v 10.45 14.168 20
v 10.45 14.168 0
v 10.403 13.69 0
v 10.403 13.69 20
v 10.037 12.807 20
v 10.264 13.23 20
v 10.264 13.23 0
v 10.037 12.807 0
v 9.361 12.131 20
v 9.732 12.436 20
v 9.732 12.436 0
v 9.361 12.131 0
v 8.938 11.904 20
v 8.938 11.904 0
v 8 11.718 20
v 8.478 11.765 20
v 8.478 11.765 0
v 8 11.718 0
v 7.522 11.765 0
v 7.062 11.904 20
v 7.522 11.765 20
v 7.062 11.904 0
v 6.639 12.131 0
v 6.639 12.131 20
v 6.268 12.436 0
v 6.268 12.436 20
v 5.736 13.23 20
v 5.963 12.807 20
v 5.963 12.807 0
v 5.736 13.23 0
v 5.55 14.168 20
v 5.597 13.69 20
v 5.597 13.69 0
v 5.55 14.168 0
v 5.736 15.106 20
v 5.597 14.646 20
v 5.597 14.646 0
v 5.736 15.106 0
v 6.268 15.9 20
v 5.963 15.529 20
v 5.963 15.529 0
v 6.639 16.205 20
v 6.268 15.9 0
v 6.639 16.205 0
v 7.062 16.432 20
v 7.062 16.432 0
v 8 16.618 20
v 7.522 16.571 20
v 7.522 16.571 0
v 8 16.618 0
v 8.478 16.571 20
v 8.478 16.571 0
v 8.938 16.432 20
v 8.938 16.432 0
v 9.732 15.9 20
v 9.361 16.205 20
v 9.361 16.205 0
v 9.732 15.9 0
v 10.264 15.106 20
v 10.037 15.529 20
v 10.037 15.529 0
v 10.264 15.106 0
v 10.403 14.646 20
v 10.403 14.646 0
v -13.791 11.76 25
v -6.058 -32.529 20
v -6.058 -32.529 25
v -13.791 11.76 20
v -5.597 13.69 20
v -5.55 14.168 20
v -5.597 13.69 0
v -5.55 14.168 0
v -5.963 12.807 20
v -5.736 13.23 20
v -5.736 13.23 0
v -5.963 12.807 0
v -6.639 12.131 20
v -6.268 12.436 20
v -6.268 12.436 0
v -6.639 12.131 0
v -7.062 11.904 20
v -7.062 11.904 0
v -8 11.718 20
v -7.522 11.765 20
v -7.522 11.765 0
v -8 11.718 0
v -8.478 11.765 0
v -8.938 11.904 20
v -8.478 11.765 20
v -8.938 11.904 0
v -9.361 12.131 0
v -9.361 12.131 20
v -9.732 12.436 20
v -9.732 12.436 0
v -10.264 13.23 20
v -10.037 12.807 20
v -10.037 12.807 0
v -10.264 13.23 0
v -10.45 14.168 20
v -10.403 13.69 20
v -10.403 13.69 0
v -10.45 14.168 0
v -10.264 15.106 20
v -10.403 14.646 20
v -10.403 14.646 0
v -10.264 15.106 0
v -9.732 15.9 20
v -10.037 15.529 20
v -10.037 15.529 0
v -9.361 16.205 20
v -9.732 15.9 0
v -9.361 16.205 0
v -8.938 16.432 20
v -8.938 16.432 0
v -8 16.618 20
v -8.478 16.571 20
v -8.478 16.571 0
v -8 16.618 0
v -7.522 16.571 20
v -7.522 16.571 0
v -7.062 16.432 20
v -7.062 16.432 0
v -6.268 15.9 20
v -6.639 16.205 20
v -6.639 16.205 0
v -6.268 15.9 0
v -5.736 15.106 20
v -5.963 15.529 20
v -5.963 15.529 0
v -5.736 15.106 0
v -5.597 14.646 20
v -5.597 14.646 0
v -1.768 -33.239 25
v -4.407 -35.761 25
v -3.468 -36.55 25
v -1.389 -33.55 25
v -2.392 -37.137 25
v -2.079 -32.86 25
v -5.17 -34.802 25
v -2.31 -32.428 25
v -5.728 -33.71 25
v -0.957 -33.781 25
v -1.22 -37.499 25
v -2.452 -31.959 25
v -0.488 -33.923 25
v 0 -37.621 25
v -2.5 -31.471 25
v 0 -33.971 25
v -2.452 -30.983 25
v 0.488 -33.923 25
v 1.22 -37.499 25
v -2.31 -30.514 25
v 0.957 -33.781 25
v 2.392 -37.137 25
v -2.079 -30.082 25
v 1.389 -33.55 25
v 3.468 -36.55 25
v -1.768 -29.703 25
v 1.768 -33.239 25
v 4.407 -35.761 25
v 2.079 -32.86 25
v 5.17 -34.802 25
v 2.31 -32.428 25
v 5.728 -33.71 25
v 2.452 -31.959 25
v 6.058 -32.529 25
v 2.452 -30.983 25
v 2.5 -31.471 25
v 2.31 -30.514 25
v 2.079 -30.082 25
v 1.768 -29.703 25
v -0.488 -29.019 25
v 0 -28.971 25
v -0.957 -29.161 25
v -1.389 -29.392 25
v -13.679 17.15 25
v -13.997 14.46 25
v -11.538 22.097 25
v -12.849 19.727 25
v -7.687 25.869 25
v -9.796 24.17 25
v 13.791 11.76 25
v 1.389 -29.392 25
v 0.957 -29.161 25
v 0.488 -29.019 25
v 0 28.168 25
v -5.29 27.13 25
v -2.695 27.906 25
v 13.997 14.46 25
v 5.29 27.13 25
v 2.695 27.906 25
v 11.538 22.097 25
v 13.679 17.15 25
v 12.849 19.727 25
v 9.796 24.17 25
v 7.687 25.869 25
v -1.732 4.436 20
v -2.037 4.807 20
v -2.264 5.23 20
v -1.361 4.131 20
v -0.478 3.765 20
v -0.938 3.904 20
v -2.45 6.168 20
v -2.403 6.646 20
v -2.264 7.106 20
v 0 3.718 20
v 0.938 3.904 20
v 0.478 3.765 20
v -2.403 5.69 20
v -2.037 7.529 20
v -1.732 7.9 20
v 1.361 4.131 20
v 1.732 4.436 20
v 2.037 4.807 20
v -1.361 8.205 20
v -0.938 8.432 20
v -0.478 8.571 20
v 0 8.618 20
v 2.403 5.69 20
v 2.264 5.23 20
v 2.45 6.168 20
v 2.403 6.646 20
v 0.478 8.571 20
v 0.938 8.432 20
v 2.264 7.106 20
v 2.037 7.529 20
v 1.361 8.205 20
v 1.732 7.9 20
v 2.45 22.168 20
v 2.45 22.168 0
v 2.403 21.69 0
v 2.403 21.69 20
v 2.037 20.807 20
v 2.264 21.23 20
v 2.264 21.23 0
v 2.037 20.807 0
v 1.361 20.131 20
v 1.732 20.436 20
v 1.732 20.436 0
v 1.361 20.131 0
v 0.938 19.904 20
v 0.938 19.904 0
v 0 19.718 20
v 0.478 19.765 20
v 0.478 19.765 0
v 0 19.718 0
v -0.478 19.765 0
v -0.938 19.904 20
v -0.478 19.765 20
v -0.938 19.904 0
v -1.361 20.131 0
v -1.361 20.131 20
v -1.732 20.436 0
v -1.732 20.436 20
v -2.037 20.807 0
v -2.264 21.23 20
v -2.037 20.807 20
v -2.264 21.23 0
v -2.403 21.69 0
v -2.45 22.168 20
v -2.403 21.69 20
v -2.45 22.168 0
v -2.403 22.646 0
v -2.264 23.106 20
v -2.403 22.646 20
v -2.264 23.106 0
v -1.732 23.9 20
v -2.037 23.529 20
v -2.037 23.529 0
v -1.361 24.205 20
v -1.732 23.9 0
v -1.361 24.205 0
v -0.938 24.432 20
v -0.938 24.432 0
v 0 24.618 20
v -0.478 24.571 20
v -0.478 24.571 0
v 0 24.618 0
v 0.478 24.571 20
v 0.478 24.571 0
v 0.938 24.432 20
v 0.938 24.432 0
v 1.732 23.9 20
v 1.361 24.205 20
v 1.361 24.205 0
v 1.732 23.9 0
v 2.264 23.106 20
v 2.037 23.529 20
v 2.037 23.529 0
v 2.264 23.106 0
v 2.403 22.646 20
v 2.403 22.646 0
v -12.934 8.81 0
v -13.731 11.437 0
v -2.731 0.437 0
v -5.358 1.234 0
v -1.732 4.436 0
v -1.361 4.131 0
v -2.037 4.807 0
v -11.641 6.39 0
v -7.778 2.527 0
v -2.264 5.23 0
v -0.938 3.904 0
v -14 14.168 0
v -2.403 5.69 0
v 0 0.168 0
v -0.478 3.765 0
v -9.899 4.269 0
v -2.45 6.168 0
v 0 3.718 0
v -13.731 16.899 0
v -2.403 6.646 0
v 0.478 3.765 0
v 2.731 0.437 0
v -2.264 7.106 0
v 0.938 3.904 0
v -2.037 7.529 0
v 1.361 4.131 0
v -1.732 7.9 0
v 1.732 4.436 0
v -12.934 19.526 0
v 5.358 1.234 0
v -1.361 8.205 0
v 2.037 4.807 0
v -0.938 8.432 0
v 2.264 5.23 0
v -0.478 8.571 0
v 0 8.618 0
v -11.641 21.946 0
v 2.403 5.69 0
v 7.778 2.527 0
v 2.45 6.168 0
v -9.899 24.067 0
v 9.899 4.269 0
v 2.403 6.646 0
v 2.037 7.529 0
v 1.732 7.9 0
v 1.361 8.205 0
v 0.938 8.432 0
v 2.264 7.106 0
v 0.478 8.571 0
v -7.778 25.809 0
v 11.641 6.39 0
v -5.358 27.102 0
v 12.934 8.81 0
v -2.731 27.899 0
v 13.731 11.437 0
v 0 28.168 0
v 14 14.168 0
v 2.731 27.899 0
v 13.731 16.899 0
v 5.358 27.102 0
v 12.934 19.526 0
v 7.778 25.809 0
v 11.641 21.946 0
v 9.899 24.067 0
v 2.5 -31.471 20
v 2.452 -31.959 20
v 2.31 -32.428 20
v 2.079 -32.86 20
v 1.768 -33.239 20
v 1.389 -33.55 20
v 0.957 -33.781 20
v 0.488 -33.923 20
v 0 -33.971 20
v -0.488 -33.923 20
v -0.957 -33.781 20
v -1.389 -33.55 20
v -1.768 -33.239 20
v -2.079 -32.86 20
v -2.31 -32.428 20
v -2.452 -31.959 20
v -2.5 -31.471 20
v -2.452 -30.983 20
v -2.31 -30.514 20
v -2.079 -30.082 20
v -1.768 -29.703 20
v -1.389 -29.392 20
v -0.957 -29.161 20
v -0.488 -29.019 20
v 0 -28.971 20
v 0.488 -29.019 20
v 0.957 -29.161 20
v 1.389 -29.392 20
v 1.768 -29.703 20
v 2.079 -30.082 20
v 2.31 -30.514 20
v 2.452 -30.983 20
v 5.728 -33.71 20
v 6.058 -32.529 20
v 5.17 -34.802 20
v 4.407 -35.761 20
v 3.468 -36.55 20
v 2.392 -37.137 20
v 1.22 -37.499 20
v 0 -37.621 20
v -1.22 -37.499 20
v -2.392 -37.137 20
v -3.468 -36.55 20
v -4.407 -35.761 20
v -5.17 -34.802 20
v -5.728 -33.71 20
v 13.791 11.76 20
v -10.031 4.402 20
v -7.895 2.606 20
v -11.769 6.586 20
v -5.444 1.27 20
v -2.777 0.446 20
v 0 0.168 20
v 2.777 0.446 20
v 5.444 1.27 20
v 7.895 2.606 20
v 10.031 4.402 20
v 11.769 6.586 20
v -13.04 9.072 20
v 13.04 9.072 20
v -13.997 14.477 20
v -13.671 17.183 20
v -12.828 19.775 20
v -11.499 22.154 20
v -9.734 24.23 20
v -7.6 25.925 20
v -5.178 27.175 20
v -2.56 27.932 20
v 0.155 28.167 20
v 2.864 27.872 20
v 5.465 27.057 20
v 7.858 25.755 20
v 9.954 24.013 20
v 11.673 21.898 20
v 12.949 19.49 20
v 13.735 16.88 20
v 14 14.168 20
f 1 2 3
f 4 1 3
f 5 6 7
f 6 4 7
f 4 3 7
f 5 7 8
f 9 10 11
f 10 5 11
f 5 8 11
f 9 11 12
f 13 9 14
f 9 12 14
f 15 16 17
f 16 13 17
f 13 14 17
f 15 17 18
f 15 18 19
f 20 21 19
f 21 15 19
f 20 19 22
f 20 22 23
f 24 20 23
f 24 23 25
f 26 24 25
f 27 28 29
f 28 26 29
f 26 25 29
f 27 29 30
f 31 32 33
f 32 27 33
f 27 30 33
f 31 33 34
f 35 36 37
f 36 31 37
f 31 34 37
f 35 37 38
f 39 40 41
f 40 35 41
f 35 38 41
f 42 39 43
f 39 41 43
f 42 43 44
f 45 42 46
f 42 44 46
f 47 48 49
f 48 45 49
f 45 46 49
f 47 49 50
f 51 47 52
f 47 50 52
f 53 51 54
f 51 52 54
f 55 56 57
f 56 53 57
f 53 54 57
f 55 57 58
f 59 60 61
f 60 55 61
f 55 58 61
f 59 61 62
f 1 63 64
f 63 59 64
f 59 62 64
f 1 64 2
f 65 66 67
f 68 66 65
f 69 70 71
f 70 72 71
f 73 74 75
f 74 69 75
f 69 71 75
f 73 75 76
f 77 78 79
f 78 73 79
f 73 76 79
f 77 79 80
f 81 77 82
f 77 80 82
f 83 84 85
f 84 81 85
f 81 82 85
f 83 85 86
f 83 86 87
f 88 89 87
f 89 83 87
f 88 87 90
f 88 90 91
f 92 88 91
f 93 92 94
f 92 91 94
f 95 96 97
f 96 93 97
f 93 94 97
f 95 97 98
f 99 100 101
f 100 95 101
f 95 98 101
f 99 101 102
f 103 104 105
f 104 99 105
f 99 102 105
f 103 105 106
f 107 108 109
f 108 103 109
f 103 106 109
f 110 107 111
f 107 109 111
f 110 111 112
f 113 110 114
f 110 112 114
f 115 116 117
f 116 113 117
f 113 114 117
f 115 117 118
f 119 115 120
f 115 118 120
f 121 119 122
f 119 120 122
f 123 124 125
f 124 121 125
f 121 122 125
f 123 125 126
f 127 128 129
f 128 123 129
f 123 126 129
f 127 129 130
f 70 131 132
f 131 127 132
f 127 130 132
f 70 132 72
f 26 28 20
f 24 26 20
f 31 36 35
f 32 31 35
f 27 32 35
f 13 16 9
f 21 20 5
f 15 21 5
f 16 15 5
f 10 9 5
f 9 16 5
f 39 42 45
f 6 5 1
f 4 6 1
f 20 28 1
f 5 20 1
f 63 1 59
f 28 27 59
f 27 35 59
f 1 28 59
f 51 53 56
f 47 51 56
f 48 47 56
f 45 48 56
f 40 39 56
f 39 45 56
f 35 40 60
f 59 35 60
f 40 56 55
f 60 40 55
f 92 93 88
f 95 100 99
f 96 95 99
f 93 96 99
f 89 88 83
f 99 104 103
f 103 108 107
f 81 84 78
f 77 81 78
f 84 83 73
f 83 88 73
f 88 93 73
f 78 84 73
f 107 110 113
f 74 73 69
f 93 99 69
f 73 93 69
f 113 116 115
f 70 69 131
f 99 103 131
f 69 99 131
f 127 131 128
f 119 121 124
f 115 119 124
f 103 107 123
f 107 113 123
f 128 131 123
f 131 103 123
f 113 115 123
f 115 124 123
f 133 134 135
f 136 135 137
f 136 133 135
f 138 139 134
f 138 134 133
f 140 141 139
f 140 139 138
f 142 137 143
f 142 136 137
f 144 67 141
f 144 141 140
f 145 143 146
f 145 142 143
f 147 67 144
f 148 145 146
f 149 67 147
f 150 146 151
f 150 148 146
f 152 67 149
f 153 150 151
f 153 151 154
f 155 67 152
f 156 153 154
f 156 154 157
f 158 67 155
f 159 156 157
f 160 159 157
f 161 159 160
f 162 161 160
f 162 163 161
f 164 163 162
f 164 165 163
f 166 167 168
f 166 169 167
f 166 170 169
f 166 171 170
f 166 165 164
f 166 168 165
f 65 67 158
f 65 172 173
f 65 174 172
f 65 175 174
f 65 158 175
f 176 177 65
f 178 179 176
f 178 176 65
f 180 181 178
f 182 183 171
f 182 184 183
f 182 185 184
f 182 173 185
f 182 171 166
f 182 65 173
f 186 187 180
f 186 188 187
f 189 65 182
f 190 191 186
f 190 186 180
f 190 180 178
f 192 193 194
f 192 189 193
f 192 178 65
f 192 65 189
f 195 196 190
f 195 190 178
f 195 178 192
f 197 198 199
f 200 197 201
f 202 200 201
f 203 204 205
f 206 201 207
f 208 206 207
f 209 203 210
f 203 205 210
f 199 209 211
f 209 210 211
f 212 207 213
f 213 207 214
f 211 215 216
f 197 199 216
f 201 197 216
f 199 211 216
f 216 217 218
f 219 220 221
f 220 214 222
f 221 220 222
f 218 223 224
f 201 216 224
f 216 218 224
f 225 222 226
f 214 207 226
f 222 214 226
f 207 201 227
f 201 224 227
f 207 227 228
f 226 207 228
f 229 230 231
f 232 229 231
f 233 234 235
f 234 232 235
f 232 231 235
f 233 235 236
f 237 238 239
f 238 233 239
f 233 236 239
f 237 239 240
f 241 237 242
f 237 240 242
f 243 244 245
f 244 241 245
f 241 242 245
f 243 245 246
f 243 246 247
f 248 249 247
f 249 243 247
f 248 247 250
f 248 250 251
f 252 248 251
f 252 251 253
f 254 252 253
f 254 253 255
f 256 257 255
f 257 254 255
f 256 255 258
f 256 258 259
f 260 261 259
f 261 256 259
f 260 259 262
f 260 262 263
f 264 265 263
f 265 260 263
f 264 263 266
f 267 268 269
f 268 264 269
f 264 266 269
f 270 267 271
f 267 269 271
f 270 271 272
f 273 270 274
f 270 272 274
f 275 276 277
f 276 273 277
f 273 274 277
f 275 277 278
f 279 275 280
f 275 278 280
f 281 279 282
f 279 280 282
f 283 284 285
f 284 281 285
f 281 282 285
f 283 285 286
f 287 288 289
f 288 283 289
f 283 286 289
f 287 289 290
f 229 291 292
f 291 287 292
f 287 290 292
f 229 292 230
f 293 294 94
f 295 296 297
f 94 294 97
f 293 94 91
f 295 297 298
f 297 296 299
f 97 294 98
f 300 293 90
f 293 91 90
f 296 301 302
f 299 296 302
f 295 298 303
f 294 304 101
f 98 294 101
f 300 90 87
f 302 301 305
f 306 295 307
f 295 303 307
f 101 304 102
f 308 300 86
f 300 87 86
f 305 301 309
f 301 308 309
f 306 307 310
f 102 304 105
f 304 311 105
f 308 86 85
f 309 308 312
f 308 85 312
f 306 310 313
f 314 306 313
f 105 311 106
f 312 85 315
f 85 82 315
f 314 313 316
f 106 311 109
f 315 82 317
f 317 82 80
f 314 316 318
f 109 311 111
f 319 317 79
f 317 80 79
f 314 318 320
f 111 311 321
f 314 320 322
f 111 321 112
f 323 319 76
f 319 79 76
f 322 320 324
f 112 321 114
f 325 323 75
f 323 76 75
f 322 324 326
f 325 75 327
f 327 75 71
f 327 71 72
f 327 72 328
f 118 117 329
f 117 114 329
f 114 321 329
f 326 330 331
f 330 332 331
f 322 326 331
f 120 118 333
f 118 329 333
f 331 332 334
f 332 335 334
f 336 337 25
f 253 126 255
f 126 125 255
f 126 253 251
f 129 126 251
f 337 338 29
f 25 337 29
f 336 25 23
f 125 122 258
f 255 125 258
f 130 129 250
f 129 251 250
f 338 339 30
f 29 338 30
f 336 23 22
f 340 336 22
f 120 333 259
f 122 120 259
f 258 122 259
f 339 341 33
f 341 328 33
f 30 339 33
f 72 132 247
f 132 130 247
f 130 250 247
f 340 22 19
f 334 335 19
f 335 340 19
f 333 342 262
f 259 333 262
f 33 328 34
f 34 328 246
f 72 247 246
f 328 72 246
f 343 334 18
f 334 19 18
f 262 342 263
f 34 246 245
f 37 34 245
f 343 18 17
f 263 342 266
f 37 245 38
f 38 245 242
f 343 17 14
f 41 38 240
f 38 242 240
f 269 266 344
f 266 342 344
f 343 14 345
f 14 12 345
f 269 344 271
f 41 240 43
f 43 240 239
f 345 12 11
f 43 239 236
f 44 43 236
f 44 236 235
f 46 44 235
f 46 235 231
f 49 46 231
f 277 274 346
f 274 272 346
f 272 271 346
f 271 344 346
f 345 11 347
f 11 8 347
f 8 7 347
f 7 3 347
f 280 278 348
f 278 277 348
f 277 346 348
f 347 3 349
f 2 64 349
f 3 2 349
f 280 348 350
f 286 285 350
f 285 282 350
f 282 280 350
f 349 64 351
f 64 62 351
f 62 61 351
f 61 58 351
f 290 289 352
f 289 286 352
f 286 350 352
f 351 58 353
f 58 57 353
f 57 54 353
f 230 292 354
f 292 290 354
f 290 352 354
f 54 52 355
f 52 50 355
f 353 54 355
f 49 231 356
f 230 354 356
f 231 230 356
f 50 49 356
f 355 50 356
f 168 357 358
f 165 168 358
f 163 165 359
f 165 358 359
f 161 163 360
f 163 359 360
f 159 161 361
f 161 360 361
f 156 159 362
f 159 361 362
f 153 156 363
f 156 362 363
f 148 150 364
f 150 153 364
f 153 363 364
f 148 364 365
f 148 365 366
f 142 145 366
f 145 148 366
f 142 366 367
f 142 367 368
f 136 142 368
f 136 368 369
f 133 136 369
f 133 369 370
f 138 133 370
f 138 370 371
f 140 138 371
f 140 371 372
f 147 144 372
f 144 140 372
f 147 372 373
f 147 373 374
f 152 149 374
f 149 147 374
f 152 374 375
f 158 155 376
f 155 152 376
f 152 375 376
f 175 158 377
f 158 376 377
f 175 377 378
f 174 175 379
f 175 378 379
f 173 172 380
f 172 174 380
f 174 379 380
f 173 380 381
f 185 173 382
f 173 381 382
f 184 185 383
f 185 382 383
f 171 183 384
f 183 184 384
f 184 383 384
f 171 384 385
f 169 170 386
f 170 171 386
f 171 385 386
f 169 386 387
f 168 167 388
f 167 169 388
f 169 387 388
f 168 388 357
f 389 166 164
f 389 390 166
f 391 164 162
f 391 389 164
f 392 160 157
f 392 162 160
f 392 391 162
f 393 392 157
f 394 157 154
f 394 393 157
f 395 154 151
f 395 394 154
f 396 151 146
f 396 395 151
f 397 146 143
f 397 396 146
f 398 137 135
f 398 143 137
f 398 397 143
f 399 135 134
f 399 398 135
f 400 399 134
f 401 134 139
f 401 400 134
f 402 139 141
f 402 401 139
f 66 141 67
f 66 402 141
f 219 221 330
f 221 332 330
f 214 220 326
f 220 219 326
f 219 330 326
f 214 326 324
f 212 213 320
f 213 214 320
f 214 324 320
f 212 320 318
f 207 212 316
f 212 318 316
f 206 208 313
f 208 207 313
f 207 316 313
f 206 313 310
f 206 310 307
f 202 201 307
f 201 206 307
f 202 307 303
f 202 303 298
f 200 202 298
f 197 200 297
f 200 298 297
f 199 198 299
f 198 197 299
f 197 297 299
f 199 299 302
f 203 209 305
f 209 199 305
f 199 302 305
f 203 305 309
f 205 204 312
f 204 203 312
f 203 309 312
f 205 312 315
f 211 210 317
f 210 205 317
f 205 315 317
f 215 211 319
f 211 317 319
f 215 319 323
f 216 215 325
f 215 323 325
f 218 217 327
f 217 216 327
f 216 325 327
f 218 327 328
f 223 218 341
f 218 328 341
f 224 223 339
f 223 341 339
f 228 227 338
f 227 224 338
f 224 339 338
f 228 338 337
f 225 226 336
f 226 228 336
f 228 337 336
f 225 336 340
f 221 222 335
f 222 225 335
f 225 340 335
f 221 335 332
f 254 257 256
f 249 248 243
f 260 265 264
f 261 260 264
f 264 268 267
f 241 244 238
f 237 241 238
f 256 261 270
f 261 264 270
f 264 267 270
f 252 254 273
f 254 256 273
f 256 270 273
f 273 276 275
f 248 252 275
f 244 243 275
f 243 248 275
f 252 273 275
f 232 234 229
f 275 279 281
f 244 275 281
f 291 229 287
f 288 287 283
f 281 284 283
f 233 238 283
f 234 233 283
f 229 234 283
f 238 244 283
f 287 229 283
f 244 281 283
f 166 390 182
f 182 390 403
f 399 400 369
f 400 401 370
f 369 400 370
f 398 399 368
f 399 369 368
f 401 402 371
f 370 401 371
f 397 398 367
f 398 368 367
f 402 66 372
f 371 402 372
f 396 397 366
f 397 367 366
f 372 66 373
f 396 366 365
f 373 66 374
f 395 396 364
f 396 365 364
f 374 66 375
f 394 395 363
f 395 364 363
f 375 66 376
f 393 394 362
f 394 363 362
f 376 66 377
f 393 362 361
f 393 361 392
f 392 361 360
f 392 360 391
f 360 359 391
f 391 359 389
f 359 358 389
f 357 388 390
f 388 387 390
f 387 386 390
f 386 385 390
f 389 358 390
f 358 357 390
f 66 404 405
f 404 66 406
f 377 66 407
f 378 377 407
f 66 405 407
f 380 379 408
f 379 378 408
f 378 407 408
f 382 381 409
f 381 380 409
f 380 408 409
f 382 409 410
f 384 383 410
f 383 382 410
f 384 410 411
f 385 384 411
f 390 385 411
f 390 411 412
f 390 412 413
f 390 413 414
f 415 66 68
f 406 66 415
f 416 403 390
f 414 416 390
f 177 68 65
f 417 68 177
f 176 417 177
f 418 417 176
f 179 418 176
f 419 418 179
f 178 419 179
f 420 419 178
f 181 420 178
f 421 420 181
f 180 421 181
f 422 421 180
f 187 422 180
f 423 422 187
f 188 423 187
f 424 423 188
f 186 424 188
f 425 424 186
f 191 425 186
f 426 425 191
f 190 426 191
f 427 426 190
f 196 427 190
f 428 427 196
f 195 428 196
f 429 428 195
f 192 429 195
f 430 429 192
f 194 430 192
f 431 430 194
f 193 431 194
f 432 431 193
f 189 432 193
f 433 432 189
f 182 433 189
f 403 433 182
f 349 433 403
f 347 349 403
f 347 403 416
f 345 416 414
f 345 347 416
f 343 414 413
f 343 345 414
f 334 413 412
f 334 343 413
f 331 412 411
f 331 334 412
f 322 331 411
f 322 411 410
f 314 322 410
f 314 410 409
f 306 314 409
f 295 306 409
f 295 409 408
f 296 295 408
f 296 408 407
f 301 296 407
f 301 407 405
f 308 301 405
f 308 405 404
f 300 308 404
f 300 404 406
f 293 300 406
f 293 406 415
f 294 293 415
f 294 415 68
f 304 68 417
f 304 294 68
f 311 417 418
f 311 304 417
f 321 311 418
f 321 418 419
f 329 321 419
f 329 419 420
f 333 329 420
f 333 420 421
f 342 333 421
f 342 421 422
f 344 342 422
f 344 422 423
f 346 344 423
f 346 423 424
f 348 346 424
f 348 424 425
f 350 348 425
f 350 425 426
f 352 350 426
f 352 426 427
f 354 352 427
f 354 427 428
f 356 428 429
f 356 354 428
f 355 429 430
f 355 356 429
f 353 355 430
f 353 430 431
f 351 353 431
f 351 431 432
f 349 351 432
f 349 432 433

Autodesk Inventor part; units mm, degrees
ref_plane "YZ Plane" through (0, 0, 0) normal (1, 0, 0) x (0, 1, 0)
ref_plane "XZ Plane" through (0, 0, 0) normal (0, 1, 0) x (-1, 0, 0)
ref_plane "XY Plane" through (0, 0, 0) normal (0, 0, 1) x (1, 0, 0)
ref_plane "Work Plane1" through (0, 0, 0) normal (0, 0, 1) x (1, 0, 0)
sketch "Sketch1" plane through (0, 0, 0) normal (0, 0, 1) x (1, 0, 0)
  circle A0 centre (0, 14.168) radius 14 projected
  circle A1 centre (8, 14.168) radius 2.45
  circle A2 centre (-8, 14.168) radius 2.45
  circle A3 centre (0, 14.168) radius 14
  circle A4 centre (0, 6.168) radius 2.45
  circle A5 centre (0, 22.168) radius 2.45
  point P0 (0, 0)
  dimension "d0" = 4.9
  dimension "d1" = 4.9
  dimension "d2" = 8
  dimension "d3" = 8
  dimension "d9" = 4.9
  dimension "d10" = 4.9
  dimension "d11" = 8
  dimension "d12" = 8
extrude "Extrusion1" add sketch "Sketch1" along normal blind 20
sketch "Sketch2" plane through (0, 14.168, 20) normal (0, 0, 1) x (1, 0, 0)
  circle A0 centre (-8, 0) radius 2.45 projected
  circle A1 centre (8, 0) radius 2.45 projected
  circle A2 centre (0, 0) radius 14 projected
  circle A3 centre (0, -45.639) radius 6.15 construction
  circle A4 centre (0, -45.639) radius 2.5
  line L0 (6.0583, -46.6969) -> (13.7914, -2.408)
  line L1 (-6.0583, -46.6969) -> (-13.7914, -2.408)
  circle A5 centre (0, 0) radius 14 projected
  arc A6 (-6.0583, -46.6969) -> (6.0583, -46.6969) centre (0, -45.639) ccw
  point P0 (0, -14.168)
  dimension "d6" = 5
extrude "Extrusion2" add sketch "Sketch2" along normal blind 5 contours A0 | A1 | A2 | A2 L0 A6 L1
properties part number "20_Cube_Insert_Z-focus_Single_LED_arm"
